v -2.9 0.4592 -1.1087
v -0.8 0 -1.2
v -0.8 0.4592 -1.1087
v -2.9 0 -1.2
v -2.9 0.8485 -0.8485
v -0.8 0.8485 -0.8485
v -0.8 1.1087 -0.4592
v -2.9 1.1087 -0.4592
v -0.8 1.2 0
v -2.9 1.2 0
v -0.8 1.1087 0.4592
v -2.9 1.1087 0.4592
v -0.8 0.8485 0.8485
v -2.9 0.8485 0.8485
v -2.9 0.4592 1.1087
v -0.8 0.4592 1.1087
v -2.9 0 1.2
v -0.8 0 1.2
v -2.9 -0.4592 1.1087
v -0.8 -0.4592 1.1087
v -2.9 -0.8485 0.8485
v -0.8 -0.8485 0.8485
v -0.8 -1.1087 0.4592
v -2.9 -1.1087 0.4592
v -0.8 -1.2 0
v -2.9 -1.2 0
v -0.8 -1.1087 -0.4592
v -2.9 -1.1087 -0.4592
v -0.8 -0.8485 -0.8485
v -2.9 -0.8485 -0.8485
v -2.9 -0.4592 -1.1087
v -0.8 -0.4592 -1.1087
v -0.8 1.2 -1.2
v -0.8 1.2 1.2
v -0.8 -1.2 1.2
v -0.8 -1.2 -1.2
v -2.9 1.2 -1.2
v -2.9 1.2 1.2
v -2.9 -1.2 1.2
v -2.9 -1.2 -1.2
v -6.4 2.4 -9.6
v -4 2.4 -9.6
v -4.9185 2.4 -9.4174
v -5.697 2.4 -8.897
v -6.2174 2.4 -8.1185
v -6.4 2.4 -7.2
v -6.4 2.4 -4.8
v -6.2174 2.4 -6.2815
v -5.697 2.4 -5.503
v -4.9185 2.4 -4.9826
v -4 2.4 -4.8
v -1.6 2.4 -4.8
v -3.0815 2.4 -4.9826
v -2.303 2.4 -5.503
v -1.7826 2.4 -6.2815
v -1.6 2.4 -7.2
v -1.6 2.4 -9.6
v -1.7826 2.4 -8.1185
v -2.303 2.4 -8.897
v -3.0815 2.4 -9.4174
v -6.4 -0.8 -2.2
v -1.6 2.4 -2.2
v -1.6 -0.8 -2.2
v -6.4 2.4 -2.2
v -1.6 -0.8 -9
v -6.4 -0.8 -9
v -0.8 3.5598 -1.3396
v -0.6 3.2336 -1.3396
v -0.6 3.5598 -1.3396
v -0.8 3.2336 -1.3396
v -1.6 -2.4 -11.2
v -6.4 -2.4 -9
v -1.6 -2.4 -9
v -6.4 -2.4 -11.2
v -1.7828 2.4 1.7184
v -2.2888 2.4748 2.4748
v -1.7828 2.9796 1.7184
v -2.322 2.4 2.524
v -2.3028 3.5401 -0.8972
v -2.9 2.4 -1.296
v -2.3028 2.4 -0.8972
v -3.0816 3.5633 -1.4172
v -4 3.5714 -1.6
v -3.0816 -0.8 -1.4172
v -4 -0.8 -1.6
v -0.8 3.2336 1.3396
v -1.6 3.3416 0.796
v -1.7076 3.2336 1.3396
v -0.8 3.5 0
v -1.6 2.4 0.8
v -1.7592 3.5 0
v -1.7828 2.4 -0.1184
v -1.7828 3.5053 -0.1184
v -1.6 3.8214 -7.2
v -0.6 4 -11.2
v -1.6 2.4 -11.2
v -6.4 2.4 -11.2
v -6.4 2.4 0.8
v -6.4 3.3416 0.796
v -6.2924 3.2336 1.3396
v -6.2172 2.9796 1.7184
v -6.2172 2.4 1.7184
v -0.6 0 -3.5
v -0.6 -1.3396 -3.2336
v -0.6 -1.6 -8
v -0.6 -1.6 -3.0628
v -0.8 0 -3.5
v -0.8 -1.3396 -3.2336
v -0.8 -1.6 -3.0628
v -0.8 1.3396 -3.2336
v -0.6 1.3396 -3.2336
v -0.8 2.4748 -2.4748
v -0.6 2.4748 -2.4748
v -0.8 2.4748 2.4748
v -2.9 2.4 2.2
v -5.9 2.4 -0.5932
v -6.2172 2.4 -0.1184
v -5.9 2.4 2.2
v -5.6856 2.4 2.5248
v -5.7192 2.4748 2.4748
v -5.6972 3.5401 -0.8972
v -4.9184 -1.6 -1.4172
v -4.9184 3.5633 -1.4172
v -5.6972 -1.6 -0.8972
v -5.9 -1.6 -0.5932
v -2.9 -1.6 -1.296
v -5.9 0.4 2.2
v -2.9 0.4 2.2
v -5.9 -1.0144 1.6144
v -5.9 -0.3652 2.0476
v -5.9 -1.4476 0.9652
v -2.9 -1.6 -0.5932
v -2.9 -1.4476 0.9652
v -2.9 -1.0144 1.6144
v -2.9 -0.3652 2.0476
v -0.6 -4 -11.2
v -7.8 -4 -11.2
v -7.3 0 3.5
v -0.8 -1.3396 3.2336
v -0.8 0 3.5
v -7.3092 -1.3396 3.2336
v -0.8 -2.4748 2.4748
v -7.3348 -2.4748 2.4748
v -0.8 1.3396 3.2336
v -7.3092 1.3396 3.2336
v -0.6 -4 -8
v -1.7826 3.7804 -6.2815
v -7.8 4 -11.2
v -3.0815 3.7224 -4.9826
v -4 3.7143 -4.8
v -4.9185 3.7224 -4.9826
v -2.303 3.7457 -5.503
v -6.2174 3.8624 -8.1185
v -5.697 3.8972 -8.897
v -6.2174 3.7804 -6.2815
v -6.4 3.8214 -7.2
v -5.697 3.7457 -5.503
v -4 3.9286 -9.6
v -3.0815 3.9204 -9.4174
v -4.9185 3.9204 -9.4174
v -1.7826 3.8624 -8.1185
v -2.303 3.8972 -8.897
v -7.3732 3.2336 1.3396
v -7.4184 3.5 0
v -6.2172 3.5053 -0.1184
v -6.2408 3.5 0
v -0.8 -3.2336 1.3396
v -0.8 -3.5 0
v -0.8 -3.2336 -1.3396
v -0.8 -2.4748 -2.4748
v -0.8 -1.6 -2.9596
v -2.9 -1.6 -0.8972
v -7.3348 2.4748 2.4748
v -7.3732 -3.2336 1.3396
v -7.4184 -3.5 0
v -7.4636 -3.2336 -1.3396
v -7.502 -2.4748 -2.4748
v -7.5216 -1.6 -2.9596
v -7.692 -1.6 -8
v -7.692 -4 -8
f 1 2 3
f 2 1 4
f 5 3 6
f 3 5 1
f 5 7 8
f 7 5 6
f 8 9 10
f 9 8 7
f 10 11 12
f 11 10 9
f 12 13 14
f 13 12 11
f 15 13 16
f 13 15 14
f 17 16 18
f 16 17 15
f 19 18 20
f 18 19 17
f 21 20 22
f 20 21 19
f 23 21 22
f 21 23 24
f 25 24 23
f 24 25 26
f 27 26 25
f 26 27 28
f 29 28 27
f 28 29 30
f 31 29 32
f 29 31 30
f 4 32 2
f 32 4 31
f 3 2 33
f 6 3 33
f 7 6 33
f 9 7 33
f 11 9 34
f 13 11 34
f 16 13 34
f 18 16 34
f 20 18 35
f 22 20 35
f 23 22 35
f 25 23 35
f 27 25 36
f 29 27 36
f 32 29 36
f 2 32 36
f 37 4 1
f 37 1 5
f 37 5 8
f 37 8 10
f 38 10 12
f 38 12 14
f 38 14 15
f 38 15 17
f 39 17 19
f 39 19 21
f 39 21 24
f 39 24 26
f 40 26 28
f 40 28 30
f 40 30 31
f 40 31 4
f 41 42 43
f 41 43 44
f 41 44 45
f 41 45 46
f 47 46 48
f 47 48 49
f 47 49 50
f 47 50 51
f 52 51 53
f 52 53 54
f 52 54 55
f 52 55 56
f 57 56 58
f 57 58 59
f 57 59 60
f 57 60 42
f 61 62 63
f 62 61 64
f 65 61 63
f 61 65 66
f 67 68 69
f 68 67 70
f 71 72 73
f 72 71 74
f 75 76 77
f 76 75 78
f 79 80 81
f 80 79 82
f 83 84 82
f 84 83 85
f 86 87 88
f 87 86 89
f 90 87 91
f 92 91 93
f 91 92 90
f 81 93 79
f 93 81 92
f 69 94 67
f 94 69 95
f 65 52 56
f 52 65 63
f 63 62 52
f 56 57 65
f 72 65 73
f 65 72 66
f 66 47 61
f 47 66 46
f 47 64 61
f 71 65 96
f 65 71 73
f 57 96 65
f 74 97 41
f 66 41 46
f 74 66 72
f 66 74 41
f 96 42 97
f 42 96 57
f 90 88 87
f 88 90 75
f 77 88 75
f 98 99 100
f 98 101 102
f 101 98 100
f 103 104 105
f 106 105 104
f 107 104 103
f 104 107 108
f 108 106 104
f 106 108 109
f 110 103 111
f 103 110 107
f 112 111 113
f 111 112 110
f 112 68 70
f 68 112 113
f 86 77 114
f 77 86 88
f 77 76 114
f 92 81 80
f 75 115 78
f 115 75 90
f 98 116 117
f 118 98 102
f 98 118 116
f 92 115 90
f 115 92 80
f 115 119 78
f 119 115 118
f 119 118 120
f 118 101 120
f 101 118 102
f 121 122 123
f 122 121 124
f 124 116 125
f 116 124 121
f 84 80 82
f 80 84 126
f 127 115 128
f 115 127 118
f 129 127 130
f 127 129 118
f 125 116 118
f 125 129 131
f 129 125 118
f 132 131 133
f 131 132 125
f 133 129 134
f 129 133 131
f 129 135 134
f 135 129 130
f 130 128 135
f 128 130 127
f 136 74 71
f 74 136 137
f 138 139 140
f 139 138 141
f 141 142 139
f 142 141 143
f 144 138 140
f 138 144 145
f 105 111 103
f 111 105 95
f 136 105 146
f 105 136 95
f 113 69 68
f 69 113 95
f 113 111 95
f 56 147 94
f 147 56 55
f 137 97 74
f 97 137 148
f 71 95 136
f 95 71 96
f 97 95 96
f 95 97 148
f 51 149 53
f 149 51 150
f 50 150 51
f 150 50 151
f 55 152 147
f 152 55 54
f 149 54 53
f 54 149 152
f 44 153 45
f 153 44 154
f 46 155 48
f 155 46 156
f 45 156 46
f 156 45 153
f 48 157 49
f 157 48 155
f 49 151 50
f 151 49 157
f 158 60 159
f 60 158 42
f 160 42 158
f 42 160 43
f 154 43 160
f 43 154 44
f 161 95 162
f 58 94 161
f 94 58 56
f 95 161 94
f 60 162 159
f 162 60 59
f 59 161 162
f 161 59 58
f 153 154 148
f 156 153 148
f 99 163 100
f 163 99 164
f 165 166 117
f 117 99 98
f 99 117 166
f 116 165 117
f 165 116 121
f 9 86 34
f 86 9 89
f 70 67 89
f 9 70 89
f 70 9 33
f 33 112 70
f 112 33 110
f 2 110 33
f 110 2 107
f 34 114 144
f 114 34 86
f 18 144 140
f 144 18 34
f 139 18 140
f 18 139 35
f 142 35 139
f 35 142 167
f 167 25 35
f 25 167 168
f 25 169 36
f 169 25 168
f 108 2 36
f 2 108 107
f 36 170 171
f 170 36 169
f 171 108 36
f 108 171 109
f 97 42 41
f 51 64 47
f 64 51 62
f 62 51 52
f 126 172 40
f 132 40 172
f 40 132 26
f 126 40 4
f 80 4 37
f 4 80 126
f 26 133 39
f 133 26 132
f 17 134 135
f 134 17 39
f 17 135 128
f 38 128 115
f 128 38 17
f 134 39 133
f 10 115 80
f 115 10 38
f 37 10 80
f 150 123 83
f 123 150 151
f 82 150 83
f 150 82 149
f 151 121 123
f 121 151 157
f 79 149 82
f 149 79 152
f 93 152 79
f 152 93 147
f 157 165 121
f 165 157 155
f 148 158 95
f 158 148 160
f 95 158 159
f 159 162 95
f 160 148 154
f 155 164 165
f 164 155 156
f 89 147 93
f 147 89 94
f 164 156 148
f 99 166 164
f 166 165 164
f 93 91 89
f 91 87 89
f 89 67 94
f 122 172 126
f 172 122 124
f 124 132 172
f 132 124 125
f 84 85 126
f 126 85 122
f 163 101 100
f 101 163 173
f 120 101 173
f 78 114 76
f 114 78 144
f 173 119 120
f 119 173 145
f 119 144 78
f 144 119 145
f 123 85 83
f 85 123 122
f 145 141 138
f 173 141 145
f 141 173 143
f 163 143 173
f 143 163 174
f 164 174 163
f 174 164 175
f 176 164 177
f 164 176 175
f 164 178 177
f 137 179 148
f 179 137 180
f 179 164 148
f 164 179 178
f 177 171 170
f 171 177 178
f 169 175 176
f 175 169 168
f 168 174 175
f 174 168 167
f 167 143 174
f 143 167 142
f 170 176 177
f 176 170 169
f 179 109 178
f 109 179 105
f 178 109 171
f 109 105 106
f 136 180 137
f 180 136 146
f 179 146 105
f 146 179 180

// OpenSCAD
use <../lib.scad>
use <3817b.scad>
function ldraw_lib__3816b() = [
// 0 Minifig Leg Right
// 0 Name: 3816b.dat
// 0 Author: Nils Schmidt [BlackBrick89]
// 0 !LDRAW_ORG Part UPDATE 2019-01
// 0 !LICENSE Licensed under CC BY 4.0 : see CAreadme.txt
// 
// 0 !HELP Move down 12 units to align with hips
// 
// 0 BFC CERTIFY CCW
  [0,"BFC","CERTIFY"],
  [0,"BFC","CCW"],
// 
// 0 !HISTORY 2019-06-28 [PTadmin] Official Update 2019-01
// 
// 
// 1 16 0 0 0 -1 0 0 0 1 0 0 0 1 3817b.dat
  [1,16,0,0,0,-1,0,0,0,1,0,0,0,1, ldraw_lib__3817b()],
];
module ldraw_lib__3816b(step=0, col=false, unit=2/5, alt=false, line=0.2, solid=!$preview)
    makepoly(ldraw_lib__3816b(), step=step, col=col, unit=unit, alt=alt, line=line, solid=solid);
ldraw_lib__3816b(line=0.2);
